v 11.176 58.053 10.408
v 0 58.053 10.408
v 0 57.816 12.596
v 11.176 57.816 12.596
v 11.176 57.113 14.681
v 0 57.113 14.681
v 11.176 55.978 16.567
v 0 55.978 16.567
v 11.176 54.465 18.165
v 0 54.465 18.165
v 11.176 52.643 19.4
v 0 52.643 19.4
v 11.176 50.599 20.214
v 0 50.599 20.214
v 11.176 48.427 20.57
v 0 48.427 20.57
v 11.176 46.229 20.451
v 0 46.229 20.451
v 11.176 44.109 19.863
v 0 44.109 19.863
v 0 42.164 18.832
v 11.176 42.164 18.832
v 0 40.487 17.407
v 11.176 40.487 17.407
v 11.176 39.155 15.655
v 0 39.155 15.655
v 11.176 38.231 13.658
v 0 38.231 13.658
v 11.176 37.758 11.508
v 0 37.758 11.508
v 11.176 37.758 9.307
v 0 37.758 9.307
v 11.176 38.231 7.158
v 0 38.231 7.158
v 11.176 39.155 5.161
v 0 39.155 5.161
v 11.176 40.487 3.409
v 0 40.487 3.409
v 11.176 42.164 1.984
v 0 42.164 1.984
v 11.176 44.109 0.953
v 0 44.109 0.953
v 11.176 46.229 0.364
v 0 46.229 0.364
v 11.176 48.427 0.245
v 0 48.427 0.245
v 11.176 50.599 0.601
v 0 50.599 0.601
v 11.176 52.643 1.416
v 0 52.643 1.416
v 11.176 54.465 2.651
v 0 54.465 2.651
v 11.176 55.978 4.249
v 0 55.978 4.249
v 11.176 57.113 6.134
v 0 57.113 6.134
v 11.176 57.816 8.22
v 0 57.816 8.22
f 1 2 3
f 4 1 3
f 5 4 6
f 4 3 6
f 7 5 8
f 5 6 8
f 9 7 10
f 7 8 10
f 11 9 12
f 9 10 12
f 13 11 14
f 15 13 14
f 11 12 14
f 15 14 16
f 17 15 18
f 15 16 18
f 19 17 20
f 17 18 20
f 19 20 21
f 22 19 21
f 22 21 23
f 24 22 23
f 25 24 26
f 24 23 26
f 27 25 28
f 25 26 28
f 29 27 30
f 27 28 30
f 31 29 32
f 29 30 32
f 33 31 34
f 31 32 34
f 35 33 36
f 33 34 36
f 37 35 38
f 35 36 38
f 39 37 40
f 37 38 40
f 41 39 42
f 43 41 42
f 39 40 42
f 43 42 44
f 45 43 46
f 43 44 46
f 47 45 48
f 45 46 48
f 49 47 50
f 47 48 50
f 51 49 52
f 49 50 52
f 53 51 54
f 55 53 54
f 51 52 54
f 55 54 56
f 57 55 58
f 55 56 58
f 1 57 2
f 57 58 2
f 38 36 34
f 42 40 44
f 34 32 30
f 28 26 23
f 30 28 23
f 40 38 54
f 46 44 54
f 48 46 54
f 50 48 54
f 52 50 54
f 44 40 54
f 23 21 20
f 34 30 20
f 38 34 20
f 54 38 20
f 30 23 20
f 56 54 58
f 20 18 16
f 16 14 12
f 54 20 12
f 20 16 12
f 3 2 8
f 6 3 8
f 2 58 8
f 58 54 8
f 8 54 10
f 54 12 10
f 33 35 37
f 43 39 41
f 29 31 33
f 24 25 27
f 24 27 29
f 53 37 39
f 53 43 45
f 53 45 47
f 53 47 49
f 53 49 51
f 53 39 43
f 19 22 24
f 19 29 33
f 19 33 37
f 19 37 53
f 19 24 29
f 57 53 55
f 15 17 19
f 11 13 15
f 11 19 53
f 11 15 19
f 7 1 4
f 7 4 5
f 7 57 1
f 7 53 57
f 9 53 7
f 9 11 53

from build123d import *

# Parameters (mm, degrees)
F0_R     = 10.177589
F1_DEPTH = 11.176
F2_R     = 10.040254
F3_DEPTH = 11.176


with BuildPart() as f1:
    # F0 (on Right) → F1 (new body)
    with BuildSketch(Plane.YZ):
        with Locations((47.875904, 10.407805)):
            Circle(F0_R)
    extrude(amount=F1_DEPTH)


with BuildPart() as f3:
    # F2 (on Right) → F3 (new body)
    with BuildSketch(Plane.YZ):
        with Locations((-41.587934, 10.073202)):
            Circle(F2_R)
    extrude(amount=F3_DEPTH)


solid = f1.part
